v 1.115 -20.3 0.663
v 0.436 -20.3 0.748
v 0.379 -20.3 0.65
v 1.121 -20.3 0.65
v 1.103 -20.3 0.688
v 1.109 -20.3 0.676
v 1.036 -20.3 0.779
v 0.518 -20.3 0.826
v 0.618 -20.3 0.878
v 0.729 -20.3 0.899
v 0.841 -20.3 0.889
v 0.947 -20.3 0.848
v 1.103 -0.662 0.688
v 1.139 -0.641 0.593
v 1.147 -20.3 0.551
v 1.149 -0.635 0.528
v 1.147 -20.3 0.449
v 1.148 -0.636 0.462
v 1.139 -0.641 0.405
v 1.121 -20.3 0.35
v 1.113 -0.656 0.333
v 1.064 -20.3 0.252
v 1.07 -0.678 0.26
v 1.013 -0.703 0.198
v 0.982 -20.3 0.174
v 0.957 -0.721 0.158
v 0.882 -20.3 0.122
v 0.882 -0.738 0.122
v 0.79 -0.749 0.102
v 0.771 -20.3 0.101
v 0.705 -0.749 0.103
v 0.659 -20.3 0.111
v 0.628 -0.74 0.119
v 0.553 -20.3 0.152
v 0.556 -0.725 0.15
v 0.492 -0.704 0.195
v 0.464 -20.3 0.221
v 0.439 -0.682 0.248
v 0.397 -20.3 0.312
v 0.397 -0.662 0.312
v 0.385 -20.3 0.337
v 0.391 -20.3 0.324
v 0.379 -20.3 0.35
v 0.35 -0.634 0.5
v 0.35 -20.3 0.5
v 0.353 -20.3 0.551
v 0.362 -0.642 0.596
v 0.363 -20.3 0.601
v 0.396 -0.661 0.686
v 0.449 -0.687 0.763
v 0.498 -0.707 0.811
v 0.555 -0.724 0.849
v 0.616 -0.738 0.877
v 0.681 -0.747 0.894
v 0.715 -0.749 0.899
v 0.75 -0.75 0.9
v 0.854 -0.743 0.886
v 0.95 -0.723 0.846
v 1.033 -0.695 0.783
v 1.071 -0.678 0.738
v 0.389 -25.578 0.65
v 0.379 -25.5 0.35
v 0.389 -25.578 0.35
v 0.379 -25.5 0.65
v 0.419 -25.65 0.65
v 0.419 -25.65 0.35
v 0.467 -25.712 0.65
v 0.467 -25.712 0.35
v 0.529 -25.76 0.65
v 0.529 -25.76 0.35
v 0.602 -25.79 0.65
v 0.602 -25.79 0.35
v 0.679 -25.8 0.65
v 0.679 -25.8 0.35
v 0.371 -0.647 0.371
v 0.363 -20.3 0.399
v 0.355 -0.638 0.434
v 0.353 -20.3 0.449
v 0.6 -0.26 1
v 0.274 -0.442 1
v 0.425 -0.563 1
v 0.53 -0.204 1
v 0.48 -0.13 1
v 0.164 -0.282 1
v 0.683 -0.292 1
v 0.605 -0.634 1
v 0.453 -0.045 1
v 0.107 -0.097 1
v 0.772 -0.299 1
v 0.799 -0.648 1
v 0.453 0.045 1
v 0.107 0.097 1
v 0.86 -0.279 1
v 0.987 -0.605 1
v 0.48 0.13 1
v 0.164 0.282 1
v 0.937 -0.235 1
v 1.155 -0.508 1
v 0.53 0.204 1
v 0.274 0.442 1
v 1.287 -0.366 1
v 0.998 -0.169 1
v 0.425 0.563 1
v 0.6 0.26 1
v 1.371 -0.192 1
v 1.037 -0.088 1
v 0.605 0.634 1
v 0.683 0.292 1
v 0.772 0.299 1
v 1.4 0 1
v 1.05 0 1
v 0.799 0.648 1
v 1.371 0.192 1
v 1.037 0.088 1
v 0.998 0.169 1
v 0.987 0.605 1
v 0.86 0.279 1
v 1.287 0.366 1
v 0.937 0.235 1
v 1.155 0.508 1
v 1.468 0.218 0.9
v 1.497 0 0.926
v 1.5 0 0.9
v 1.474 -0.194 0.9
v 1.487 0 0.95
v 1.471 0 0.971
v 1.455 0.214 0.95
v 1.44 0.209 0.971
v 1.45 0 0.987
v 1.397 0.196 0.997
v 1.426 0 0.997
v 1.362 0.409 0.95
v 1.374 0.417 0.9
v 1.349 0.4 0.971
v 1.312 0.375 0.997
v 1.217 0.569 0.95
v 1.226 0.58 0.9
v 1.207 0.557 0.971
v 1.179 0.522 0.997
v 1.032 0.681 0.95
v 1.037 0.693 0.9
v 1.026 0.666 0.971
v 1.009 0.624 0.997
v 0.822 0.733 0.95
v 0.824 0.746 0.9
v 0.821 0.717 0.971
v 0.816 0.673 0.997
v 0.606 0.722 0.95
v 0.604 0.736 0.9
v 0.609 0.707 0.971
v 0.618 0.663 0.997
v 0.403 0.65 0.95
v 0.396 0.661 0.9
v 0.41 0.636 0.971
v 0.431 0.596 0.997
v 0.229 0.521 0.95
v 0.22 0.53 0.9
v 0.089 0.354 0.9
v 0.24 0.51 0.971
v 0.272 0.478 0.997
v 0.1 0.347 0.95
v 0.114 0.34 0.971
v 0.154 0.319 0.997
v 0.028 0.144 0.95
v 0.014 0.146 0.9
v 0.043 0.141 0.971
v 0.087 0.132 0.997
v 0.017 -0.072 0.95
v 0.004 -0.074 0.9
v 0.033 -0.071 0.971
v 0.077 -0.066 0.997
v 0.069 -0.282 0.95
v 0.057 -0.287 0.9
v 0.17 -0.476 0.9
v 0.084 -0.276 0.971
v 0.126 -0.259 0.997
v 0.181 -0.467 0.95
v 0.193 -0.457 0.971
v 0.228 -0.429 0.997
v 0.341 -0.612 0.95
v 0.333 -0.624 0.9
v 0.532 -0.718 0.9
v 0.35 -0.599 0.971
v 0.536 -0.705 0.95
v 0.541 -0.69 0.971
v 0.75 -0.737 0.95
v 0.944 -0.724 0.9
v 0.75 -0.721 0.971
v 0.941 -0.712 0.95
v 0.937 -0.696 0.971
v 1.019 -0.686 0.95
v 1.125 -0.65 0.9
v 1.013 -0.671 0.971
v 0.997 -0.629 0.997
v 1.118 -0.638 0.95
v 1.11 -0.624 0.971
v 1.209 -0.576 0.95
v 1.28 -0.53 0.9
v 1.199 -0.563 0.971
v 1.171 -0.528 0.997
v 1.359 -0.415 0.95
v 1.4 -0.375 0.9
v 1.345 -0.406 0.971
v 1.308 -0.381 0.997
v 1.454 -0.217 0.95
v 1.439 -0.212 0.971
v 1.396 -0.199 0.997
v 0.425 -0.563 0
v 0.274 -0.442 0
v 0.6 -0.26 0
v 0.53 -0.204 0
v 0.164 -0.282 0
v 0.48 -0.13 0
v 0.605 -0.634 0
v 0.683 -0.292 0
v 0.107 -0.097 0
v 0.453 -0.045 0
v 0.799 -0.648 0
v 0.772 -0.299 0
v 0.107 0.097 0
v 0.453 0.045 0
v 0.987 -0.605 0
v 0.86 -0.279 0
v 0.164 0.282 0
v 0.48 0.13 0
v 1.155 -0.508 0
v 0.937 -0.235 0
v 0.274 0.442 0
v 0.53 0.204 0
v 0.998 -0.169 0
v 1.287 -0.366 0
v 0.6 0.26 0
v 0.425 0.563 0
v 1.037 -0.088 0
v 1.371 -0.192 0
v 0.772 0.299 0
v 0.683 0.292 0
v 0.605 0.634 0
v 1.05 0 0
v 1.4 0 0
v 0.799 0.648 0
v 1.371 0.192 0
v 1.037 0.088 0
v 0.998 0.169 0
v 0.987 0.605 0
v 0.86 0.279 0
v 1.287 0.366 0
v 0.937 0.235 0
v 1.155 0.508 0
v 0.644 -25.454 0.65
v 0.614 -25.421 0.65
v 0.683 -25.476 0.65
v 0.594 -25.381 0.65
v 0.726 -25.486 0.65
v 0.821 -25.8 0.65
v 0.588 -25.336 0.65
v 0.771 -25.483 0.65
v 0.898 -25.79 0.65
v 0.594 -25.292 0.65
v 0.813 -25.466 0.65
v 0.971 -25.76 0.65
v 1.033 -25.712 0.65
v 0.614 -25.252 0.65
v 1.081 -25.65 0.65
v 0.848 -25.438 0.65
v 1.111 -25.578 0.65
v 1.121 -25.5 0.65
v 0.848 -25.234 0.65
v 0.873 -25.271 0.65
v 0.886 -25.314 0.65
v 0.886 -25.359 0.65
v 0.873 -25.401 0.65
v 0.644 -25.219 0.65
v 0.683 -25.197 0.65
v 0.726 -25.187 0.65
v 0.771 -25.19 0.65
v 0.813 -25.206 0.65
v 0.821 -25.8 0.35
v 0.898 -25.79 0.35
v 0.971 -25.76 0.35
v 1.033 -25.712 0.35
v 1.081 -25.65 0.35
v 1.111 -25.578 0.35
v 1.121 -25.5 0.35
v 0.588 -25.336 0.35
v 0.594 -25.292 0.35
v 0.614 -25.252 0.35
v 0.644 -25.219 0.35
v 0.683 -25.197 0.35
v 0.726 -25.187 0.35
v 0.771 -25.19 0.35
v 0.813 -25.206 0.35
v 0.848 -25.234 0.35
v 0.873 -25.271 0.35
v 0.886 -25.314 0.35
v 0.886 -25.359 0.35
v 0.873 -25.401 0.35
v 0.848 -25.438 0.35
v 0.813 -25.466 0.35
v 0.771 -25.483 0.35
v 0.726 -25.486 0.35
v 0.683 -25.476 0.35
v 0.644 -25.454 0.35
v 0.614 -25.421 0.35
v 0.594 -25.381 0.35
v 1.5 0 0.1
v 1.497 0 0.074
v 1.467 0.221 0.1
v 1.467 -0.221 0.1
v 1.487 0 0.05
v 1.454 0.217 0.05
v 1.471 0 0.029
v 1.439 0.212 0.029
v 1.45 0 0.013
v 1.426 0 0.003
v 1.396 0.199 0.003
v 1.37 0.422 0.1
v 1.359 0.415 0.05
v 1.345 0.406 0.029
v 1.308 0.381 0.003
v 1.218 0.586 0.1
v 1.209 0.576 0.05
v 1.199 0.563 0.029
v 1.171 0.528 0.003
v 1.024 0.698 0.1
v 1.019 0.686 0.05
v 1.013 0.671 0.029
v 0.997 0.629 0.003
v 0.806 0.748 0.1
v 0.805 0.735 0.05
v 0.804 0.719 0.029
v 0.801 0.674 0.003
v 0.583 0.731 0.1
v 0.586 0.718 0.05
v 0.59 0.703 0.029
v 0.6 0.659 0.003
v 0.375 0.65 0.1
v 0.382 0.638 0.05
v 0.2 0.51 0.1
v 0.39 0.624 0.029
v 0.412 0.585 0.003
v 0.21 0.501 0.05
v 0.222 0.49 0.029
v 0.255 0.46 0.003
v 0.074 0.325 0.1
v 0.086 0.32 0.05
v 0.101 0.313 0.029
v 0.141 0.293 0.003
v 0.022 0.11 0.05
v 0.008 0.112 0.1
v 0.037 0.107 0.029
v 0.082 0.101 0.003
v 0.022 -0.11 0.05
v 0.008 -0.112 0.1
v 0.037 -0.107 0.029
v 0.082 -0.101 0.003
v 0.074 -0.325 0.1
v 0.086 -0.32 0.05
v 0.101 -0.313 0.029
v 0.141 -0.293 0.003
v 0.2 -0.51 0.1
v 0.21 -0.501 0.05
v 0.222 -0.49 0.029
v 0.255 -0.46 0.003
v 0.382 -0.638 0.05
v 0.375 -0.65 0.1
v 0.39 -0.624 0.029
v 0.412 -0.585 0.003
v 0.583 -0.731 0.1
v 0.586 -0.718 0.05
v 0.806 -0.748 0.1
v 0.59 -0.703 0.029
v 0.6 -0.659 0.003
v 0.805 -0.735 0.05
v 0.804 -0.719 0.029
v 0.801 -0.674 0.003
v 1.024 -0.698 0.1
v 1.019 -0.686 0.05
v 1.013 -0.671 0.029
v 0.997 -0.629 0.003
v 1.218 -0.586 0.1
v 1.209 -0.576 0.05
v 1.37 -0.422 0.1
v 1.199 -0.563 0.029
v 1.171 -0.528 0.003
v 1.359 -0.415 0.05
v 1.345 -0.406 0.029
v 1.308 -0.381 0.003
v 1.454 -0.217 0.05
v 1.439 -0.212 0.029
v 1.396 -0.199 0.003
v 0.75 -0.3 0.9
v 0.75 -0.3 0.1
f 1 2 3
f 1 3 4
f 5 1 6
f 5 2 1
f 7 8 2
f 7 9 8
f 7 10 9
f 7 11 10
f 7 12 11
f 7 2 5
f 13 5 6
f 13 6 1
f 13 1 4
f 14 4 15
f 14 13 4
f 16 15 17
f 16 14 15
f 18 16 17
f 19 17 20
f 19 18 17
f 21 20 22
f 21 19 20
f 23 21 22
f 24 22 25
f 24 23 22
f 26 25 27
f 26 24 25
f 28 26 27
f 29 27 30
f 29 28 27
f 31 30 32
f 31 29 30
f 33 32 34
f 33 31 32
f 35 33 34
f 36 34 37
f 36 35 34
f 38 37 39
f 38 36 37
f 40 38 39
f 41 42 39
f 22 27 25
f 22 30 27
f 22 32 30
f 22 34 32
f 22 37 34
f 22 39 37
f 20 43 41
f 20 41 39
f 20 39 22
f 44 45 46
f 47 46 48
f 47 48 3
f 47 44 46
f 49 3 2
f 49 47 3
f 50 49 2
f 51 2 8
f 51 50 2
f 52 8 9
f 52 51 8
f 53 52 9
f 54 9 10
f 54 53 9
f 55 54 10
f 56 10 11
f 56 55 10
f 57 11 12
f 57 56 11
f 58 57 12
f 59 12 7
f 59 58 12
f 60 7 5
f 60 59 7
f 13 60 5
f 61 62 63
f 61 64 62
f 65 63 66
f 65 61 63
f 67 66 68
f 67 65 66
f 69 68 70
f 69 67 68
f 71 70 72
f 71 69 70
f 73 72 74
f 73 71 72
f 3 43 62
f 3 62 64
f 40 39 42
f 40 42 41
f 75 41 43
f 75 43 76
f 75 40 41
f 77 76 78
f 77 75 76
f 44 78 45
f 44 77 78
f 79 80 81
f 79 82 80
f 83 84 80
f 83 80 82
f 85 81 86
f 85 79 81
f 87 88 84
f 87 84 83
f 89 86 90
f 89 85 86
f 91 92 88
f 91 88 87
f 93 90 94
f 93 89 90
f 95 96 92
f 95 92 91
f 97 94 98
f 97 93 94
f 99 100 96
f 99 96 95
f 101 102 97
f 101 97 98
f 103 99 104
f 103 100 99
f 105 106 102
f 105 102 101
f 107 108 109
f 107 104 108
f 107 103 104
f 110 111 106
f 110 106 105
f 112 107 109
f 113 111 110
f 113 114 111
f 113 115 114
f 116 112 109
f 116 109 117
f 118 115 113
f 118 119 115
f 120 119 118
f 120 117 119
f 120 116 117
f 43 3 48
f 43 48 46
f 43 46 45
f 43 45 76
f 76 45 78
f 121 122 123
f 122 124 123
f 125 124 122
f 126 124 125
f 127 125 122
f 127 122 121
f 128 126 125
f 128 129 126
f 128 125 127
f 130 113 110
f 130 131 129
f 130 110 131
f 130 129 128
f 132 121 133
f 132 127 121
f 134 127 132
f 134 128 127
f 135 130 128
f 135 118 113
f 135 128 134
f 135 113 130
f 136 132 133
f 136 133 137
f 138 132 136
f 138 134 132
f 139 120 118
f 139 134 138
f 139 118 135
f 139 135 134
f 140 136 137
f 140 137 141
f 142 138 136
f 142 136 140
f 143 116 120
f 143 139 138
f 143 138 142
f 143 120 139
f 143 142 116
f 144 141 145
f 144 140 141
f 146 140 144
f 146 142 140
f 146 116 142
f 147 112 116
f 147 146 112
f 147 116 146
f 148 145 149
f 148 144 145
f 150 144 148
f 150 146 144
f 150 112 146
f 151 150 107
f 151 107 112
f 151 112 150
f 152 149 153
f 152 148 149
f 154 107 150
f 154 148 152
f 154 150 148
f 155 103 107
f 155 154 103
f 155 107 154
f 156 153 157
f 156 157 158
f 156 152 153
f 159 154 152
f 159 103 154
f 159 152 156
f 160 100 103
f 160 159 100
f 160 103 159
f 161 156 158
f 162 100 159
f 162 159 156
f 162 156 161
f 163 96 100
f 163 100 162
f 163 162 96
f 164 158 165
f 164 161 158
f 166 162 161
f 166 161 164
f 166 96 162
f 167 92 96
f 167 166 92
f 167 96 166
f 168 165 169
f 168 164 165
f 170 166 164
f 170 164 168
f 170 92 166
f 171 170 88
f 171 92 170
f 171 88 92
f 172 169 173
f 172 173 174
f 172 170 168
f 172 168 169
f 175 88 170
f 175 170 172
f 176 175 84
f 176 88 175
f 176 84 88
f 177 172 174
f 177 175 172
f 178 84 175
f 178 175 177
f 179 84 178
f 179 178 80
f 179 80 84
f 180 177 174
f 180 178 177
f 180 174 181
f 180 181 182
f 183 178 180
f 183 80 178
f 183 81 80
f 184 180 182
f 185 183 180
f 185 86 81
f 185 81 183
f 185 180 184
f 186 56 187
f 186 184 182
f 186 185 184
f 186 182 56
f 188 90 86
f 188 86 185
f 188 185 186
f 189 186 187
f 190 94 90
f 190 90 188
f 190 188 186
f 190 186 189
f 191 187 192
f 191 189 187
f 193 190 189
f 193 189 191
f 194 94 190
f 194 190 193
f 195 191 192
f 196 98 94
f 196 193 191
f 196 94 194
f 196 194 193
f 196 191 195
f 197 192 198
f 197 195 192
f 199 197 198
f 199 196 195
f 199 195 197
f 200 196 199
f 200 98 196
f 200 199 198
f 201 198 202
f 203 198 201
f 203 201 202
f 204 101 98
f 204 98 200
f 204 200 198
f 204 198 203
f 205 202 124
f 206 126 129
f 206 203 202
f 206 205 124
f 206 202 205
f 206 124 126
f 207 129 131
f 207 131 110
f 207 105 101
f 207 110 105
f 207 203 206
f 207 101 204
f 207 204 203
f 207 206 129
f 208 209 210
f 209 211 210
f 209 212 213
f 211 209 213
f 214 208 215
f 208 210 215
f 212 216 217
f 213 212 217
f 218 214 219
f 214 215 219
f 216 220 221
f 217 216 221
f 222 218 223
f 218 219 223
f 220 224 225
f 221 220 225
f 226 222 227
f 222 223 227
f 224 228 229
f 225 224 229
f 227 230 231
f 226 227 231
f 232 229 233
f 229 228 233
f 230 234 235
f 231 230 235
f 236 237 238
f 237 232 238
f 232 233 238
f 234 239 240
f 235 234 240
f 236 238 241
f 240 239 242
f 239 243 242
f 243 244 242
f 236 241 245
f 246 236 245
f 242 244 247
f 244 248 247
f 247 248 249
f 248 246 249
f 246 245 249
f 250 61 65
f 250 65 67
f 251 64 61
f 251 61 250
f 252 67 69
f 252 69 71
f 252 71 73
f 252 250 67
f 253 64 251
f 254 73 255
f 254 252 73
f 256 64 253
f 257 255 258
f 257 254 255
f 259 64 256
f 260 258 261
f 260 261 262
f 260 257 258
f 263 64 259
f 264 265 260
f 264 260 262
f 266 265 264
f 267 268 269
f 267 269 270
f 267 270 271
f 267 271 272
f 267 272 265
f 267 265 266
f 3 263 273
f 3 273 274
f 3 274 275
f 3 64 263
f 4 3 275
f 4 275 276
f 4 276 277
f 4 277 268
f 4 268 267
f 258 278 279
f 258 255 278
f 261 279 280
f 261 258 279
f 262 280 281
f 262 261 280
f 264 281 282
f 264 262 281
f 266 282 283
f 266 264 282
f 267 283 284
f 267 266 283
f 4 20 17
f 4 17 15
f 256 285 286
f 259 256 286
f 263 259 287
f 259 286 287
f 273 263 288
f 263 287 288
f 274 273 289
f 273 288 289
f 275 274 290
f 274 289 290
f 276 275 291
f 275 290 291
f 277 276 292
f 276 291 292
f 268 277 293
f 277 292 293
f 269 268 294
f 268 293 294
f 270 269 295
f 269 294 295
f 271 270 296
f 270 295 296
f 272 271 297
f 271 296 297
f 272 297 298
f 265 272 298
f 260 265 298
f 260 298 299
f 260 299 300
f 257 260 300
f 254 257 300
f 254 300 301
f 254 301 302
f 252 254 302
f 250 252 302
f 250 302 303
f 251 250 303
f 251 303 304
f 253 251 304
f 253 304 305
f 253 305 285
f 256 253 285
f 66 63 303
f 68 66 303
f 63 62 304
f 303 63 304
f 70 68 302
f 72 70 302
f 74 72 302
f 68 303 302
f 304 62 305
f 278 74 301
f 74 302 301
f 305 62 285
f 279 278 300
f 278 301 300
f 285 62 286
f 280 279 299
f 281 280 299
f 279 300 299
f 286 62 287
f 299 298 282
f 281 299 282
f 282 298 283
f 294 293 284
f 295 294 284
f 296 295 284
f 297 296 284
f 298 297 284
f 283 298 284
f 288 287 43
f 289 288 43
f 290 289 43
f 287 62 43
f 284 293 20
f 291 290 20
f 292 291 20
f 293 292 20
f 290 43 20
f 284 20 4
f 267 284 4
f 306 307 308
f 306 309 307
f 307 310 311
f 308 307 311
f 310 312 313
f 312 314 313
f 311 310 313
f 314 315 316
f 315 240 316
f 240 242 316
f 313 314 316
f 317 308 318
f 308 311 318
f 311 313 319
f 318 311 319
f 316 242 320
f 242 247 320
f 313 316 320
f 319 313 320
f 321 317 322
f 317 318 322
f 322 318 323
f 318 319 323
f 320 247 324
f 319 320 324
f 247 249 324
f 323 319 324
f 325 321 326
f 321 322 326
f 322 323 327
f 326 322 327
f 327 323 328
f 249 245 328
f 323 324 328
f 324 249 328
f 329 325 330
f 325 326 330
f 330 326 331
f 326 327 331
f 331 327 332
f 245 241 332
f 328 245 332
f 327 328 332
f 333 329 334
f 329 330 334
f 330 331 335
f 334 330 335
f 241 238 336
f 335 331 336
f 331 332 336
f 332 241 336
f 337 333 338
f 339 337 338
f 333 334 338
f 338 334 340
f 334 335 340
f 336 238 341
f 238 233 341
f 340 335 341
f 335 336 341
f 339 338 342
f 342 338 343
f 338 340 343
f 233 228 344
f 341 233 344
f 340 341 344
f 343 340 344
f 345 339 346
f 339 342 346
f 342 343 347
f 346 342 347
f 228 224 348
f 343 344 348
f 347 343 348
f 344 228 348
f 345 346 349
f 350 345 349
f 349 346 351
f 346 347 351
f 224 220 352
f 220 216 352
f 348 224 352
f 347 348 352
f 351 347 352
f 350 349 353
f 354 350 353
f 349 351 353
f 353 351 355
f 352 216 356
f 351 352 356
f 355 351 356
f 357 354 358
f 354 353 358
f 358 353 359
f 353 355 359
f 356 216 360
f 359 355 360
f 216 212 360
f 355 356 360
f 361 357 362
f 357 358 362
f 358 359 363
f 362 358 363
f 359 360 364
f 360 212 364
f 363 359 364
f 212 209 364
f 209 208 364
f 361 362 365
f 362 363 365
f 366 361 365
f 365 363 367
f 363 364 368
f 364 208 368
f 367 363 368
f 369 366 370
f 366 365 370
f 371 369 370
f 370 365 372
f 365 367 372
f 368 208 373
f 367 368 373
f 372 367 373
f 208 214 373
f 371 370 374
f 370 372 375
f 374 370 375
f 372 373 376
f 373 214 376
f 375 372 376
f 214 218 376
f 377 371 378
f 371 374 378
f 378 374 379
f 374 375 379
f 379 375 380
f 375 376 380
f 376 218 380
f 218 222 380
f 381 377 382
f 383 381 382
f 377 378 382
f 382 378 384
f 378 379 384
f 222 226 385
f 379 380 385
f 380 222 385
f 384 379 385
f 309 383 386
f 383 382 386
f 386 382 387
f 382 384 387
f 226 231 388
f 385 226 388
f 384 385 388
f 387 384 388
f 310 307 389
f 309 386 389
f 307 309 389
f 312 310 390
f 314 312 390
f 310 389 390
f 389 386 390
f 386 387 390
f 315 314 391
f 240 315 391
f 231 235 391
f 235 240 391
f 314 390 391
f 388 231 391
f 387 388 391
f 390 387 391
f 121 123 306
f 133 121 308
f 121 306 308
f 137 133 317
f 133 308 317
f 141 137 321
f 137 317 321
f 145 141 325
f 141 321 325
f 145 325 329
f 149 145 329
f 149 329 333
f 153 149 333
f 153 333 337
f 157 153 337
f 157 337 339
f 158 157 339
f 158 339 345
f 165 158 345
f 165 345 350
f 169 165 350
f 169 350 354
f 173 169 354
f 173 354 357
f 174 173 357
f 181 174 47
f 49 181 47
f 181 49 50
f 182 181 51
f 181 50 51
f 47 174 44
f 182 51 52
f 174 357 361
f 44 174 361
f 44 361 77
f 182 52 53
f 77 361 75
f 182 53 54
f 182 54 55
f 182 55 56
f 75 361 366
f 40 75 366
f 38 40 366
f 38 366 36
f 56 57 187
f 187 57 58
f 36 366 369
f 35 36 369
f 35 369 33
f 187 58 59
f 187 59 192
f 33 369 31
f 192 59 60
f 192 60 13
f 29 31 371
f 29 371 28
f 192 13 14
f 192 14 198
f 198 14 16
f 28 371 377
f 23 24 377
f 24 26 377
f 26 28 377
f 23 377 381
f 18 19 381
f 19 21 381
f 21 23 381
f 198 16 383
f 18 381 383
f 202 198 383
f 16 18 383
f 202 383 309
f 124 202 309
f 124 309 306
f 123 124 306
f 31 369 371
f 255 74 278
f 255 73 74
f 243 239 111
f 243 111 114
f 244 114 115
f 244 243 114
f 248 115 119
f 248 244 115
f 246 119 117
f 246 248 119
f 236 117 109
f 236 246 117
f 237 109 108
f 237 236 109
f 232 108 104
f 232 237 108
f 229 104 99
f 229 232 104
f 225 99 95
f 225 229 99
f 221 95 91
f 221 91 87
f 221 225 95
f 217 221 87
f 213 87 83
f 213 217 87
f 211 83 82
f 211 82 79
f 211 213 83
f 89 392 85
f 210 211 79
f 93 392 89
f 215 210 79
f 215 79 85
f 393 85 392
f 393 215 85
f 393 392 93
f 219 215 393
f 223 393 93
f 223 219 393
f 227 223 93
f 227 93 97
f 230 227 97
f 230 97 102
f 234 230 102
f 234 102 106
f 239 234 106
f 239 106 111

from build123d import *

# Parameters (mm, degrees)
SKETCH_1_R          = 0.75
SKETCH_1_R_2        = 0.3
EXTRUDE_1_DEPTH     = 1
FILLET_1_R          = 0.1
EXTRUDE_2_DEPTH     = 40
SKETCH_3_R          = 2.953544
CUT_EXTRUDE_1_DEPTH = 20
SKETCH_4_W          = 0.74162
SKETCH_4_H          = 0.3
EXTRUDE_3_DEPTH     = 5.5
SKETCH_6_R          = 0.15
CUT_EXTRUDE_2_DEPTH = 5.5
FILLET_2_R          = 0.3


with BuildPart() as part:
    # 草图1 → 凸台-拉伸1 (new body)
    with BuildSketch(Plane.XY):
        with Locations((0.75, 0)):
            Circle(SKETCH_1_R)
        with Locations((0.75, 0)):
            Circle(SKETCH_1_R_2, mode=Mode.SUBTRACT)
    extrude(amount=EXTRUDE_1_DEPTH)

    # 圆角1
    fillet_1_edges = [part.edges().sort_by_distance(p)[0] for p in [
        (0, 0, 1),
        (0, 0, 0),
    ]]
    fillet(fillet_1_edges, radius=FILLET_1_R)

    # 草图2 → 凸台-拉伸2 (add)
    with BuildSketch(Plane(origin=(0, -0.3, 0), x_dir=(-1, 0, 0), z_dir=(0, 1, 0))):
        with BuildLine():
            ThreePointArc((-0.35, 0.5), (-0.652986, 0.888057), (-1.102941, 0.688235))
            Line((-1.102941, 0.688235), (-0.397059, 0.311765))
            ThreePointArc((-0.397059, 0.311765), (-0.361943, 0.402986), (-0.35, 0.5))
        make_face()
        with BuildLine():
            Line((-0.397059, 0.311765), (-1.102941, 0.688235))
            ThreePointArc((-1.102941, 0.688235), (-0.938235, 0.147059), (-0.397059, 0.311765))
        make_face()
    extrude(amount=-EXTRUDE_2_DEPTH)

    # 草图3 → 切除-拉伸1 (cut)
    with BuildSketch(Plane.XZ.offset(40.3)):
        with Locations((0.75, 0.5)):
            Circle(SKETCH_3_R)
    extrude(amount=-CUT_EXTRUDE_1_DEPTH, mode=Mode.SUBTRACT)

    # 草图4 → 凸台-拉伸3 (add)
    with BuildSketch(Plane.XZ.offset(20.3)):
        with Locations((0.75, 0.5)):
            Rectangle(SKETCH_4_W, SKETCH_4_H)
    extrude(amount=EXTRUDE_3_DEPTH)

    # 草图6 → 切除-拉伸2 (cut)
    with BuildSketch(Plane(origin=(0, 0, 0.35), x_dir=(-1, 0, 0), z_dir=(0, 0, -1))):
        with Locations((-0.737636, -25.336312)):
            Circle(SKETCH_6_R)
    extrude(amount=-CUT_EXTRUDE_2_DEPTH, mode=Mode.SUBTRACT)

    # 圆角2
    fillet_2_edges = [part.edges().sort_by_distance(p)[0] for p in [
        (1.12081, -25.8, 0.5),
        (0.37919, -25.8, 0.5),
    ]]
    fillet(fillet_2_edges, radius=FILLET_2_R)


solid = part.part
